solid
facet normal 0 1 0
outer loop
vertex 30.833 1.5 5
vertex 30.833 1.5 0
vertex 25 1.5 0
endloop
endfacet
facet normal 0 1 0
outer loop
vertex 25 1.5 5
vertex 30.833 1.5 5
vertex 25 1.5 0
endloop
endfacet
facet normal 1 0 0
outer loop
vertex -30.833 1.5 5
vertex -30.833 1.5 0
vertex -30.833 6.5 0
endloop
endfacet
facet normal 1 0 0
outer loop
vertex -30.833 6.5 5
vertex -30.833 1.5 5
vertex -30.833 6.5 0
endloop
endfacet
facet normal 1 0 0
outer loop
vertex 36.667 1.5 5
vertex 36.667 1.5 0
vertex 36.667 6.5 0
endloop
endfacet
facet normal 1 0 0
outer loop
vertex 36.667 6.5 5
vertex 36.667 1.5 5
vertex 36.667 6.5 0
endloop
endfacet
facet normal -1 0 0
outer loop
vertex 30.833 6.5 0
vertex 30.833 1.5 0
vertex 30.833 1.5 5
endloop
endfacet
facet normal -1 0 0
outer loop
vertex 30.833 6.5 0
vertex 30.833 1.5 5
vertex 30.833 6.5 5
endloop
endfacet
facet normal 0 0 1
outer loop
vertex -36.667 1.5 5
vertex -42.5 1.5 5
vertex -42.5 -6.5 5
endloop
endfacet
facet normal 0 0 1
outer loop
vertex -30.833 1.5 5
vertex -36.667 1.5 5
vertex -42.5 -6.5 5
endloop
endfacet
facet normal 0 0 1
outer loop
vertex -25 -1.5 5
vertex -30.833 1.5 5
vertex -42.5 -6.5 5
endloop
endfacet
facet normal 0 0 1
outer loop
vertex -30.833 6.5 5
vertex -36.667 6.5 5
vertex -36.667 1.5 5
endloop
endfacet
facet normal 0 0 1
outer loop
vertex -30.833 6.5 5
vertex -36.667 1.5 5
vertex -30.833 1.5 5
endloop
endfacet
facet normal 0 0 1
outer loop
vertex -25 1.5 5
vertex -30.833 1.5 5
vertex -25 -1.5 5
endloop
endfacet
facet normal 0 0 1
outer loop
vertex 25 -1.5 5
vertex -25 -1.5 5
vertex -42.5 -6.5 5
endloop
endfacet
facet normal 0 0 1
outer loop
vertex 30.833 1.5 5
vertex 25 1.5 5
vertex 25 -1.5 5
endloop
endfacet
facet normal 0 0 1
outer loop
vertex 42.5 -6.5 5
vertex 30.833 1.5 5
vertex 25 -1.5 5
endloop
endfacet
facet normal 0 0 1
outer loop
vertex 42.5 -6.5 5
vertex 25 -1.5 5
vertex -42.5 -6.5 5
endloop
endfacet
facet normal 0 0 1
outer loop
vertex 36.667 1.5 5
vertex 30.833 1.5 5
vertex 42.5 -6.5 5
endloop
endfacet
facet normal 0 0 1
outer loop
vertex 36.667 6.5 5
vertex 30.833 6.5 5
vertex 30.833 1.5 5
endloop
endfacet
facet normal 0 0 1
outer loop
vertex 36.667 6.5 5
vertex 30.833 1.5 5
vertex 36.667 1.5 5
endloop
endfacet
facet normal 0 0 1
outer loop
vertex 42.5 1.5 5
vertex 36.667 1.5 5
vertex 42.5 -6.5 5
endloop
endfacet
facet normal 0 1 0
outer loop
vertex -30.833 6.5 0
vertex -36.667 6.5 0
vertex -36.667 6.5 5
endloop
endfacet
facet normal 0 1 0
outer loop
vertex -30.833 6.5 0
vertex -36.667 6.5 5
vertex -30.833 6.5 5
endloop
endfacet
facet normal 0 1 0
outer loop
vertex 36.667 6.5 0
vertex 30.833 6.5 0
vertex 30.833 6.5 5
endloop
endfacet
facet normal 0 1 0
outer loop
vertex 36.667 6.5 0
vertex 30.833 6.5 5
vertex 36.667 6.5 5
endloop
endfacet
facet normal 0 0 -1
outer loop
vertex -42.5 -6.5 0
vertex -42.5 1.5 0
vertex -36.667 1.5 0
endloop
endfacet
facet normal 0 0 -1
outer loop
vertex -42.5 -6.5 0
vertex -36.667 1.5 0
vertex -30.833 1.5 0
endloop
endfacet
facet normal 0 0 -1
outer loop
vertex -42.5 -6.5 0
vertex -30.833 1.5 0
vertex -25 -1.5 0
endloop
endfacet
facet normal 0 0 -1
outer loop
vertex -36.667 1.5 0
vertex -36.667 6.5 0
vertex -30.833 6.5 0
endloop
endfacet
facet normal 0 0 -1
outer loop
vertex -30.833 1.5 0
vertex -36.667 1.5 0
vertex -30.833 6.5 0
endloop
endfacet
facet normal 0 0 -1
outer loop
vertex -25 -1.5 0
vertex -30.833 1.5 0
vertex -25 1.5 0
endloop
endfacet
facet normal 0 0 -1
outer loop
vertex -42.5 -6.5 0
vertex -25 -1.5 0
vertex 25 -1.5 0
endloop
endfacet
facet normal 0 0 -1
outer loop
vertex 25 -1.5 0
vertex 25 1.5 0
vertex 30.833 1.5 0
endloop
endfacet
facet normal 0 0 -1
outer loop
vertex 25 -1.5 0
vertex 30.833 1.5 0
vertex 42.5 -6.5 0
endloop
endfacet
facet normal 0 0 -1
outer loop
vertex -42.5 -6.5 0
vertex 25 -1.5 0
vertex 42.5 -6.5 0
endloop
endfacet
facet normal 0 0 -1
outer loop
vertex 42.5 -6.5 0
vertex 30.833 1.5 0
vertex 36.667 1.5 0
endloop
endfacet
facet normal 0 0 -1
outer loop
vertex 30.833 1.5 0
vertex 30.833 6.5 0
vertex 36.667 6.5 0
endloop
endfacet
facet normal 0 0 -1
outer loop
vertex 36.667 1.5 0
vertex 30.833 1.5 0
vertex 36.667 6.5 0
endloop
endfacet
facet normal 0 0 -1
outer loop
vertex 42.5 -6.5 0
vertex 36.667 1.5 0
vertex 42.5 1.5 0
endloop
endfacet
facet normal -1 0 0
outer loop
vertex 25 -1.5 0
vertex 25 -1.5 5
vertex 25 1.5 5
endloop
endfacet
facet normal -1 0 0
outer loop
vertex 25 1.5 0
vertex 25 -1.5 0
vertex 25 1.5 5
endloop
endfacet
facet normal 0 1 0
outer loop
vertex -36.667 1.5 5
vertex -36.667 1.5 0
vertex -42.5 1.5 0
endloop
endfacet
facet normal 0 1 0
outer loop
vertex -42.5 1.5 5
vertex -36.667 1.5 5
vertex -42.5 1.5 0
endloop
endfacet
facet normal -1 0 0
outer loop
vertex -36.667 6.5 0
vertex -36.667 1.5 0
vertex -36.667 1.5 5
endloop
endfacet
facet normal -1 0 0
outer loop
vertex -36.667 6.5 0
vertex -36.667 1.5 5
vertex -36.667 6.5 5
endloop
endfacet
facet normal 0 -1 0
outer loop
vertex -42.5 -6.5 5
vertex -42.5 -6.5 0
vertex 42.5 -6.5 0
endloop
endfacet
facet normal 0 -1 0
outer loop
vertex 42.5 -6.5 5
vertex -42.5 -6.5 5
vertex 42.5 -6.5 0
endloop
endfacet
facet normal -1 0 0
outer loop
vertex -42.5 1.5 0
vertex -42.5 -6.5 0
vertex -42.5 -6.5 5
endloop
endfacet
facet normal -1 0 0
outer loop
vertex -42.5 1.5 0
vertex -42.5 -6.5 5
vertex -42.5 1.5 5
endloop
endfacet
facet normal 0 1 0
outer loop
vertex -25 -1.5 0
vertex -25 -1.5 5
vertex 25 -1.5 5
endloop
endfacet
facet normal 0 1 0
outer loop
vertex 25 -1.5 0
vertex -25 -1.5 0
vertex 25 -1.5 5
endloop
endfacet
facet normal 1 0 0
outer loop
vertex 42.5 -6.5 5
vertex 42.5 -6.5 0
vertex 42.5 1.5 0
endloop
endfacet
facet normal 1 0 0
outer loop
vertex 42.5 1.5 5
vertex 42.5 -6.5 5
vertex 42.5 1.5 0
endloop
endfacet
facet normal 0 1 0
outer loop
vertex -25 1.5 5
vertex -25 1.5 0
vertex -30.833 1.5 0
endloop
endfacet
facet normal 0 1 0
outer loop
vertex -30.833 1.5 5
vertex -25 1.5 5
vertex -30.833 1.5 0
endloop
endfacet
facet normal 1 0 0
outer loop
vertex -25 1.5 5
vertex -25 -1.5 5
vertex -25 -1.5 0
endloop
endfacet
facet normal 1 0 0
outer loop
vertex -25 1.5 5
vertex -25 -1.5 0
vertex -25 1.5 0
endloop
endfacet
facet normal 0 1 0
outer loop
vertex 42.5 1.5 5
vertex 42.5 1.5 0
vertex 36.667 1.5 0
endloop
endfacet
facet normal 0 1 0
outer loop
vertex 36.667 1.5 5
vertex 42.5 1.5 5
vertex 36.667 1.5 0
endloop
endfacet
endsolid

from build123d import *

# Parameters (mm, degrees)
SKETCH1_W           = 85
SKETCH1_H           = 13
BOSS_EXTRUDE1_DEPTH = 5
SKETCH2_W           = 50
SKETCH2_H           = 3
CUT_EXTRUDE1_DEPTH  = 44.283946216
SKETCH3_W           = 5.833333
SKETCH3_H           = 5
SKETCH3_W_2         = 61.666668
CUT_EXTRUDE2_DEPTH  = 44.283946216


with BuildPart() as part:
    # Sketch1 → Boss-Extrude1 (new body)
    with BuildSketch(Plane.XY):
        Rectangle(SKETCH1_W, SKETCH1_H)
    extrude(amount=BOSS_EXTRUDE1_DEPTH)

    # Sketch2 → Cut-Extrude1 (cut, through all)
    with BuildSketch(Plane.XY.offset(5)):
        Rectangle(SKETCH2_W, SKETCH2_H)
    extrude(amount=-CUT_EXTRUDE1_DEPTH, mode=Mode.SUBTRACT)

    # Sketch3 → Cut-Extrude2 (cut, through all)
    with BuildSketch(Plane(origin=(0, 0, 0), x_dir=(-1, 0, 0), z_dir=(0, 0, -1))):
        with Locations((-39.5833335, 4)):
            Rectangle(SKETCH3_W, SKETCH3_H)
        with Locations((0, 4)):
            Rectangle(SKETCH3_W_2, SKETCH3_H)
        with Locations((39.5833335, 4)):
            Rectangle(SKETCH3_W, SKETCH3_H)
    extrude(amount=-CUT_EXTRUDE2_DEPTH, mode=Mode.SUBTRACT)


solid = part.part
